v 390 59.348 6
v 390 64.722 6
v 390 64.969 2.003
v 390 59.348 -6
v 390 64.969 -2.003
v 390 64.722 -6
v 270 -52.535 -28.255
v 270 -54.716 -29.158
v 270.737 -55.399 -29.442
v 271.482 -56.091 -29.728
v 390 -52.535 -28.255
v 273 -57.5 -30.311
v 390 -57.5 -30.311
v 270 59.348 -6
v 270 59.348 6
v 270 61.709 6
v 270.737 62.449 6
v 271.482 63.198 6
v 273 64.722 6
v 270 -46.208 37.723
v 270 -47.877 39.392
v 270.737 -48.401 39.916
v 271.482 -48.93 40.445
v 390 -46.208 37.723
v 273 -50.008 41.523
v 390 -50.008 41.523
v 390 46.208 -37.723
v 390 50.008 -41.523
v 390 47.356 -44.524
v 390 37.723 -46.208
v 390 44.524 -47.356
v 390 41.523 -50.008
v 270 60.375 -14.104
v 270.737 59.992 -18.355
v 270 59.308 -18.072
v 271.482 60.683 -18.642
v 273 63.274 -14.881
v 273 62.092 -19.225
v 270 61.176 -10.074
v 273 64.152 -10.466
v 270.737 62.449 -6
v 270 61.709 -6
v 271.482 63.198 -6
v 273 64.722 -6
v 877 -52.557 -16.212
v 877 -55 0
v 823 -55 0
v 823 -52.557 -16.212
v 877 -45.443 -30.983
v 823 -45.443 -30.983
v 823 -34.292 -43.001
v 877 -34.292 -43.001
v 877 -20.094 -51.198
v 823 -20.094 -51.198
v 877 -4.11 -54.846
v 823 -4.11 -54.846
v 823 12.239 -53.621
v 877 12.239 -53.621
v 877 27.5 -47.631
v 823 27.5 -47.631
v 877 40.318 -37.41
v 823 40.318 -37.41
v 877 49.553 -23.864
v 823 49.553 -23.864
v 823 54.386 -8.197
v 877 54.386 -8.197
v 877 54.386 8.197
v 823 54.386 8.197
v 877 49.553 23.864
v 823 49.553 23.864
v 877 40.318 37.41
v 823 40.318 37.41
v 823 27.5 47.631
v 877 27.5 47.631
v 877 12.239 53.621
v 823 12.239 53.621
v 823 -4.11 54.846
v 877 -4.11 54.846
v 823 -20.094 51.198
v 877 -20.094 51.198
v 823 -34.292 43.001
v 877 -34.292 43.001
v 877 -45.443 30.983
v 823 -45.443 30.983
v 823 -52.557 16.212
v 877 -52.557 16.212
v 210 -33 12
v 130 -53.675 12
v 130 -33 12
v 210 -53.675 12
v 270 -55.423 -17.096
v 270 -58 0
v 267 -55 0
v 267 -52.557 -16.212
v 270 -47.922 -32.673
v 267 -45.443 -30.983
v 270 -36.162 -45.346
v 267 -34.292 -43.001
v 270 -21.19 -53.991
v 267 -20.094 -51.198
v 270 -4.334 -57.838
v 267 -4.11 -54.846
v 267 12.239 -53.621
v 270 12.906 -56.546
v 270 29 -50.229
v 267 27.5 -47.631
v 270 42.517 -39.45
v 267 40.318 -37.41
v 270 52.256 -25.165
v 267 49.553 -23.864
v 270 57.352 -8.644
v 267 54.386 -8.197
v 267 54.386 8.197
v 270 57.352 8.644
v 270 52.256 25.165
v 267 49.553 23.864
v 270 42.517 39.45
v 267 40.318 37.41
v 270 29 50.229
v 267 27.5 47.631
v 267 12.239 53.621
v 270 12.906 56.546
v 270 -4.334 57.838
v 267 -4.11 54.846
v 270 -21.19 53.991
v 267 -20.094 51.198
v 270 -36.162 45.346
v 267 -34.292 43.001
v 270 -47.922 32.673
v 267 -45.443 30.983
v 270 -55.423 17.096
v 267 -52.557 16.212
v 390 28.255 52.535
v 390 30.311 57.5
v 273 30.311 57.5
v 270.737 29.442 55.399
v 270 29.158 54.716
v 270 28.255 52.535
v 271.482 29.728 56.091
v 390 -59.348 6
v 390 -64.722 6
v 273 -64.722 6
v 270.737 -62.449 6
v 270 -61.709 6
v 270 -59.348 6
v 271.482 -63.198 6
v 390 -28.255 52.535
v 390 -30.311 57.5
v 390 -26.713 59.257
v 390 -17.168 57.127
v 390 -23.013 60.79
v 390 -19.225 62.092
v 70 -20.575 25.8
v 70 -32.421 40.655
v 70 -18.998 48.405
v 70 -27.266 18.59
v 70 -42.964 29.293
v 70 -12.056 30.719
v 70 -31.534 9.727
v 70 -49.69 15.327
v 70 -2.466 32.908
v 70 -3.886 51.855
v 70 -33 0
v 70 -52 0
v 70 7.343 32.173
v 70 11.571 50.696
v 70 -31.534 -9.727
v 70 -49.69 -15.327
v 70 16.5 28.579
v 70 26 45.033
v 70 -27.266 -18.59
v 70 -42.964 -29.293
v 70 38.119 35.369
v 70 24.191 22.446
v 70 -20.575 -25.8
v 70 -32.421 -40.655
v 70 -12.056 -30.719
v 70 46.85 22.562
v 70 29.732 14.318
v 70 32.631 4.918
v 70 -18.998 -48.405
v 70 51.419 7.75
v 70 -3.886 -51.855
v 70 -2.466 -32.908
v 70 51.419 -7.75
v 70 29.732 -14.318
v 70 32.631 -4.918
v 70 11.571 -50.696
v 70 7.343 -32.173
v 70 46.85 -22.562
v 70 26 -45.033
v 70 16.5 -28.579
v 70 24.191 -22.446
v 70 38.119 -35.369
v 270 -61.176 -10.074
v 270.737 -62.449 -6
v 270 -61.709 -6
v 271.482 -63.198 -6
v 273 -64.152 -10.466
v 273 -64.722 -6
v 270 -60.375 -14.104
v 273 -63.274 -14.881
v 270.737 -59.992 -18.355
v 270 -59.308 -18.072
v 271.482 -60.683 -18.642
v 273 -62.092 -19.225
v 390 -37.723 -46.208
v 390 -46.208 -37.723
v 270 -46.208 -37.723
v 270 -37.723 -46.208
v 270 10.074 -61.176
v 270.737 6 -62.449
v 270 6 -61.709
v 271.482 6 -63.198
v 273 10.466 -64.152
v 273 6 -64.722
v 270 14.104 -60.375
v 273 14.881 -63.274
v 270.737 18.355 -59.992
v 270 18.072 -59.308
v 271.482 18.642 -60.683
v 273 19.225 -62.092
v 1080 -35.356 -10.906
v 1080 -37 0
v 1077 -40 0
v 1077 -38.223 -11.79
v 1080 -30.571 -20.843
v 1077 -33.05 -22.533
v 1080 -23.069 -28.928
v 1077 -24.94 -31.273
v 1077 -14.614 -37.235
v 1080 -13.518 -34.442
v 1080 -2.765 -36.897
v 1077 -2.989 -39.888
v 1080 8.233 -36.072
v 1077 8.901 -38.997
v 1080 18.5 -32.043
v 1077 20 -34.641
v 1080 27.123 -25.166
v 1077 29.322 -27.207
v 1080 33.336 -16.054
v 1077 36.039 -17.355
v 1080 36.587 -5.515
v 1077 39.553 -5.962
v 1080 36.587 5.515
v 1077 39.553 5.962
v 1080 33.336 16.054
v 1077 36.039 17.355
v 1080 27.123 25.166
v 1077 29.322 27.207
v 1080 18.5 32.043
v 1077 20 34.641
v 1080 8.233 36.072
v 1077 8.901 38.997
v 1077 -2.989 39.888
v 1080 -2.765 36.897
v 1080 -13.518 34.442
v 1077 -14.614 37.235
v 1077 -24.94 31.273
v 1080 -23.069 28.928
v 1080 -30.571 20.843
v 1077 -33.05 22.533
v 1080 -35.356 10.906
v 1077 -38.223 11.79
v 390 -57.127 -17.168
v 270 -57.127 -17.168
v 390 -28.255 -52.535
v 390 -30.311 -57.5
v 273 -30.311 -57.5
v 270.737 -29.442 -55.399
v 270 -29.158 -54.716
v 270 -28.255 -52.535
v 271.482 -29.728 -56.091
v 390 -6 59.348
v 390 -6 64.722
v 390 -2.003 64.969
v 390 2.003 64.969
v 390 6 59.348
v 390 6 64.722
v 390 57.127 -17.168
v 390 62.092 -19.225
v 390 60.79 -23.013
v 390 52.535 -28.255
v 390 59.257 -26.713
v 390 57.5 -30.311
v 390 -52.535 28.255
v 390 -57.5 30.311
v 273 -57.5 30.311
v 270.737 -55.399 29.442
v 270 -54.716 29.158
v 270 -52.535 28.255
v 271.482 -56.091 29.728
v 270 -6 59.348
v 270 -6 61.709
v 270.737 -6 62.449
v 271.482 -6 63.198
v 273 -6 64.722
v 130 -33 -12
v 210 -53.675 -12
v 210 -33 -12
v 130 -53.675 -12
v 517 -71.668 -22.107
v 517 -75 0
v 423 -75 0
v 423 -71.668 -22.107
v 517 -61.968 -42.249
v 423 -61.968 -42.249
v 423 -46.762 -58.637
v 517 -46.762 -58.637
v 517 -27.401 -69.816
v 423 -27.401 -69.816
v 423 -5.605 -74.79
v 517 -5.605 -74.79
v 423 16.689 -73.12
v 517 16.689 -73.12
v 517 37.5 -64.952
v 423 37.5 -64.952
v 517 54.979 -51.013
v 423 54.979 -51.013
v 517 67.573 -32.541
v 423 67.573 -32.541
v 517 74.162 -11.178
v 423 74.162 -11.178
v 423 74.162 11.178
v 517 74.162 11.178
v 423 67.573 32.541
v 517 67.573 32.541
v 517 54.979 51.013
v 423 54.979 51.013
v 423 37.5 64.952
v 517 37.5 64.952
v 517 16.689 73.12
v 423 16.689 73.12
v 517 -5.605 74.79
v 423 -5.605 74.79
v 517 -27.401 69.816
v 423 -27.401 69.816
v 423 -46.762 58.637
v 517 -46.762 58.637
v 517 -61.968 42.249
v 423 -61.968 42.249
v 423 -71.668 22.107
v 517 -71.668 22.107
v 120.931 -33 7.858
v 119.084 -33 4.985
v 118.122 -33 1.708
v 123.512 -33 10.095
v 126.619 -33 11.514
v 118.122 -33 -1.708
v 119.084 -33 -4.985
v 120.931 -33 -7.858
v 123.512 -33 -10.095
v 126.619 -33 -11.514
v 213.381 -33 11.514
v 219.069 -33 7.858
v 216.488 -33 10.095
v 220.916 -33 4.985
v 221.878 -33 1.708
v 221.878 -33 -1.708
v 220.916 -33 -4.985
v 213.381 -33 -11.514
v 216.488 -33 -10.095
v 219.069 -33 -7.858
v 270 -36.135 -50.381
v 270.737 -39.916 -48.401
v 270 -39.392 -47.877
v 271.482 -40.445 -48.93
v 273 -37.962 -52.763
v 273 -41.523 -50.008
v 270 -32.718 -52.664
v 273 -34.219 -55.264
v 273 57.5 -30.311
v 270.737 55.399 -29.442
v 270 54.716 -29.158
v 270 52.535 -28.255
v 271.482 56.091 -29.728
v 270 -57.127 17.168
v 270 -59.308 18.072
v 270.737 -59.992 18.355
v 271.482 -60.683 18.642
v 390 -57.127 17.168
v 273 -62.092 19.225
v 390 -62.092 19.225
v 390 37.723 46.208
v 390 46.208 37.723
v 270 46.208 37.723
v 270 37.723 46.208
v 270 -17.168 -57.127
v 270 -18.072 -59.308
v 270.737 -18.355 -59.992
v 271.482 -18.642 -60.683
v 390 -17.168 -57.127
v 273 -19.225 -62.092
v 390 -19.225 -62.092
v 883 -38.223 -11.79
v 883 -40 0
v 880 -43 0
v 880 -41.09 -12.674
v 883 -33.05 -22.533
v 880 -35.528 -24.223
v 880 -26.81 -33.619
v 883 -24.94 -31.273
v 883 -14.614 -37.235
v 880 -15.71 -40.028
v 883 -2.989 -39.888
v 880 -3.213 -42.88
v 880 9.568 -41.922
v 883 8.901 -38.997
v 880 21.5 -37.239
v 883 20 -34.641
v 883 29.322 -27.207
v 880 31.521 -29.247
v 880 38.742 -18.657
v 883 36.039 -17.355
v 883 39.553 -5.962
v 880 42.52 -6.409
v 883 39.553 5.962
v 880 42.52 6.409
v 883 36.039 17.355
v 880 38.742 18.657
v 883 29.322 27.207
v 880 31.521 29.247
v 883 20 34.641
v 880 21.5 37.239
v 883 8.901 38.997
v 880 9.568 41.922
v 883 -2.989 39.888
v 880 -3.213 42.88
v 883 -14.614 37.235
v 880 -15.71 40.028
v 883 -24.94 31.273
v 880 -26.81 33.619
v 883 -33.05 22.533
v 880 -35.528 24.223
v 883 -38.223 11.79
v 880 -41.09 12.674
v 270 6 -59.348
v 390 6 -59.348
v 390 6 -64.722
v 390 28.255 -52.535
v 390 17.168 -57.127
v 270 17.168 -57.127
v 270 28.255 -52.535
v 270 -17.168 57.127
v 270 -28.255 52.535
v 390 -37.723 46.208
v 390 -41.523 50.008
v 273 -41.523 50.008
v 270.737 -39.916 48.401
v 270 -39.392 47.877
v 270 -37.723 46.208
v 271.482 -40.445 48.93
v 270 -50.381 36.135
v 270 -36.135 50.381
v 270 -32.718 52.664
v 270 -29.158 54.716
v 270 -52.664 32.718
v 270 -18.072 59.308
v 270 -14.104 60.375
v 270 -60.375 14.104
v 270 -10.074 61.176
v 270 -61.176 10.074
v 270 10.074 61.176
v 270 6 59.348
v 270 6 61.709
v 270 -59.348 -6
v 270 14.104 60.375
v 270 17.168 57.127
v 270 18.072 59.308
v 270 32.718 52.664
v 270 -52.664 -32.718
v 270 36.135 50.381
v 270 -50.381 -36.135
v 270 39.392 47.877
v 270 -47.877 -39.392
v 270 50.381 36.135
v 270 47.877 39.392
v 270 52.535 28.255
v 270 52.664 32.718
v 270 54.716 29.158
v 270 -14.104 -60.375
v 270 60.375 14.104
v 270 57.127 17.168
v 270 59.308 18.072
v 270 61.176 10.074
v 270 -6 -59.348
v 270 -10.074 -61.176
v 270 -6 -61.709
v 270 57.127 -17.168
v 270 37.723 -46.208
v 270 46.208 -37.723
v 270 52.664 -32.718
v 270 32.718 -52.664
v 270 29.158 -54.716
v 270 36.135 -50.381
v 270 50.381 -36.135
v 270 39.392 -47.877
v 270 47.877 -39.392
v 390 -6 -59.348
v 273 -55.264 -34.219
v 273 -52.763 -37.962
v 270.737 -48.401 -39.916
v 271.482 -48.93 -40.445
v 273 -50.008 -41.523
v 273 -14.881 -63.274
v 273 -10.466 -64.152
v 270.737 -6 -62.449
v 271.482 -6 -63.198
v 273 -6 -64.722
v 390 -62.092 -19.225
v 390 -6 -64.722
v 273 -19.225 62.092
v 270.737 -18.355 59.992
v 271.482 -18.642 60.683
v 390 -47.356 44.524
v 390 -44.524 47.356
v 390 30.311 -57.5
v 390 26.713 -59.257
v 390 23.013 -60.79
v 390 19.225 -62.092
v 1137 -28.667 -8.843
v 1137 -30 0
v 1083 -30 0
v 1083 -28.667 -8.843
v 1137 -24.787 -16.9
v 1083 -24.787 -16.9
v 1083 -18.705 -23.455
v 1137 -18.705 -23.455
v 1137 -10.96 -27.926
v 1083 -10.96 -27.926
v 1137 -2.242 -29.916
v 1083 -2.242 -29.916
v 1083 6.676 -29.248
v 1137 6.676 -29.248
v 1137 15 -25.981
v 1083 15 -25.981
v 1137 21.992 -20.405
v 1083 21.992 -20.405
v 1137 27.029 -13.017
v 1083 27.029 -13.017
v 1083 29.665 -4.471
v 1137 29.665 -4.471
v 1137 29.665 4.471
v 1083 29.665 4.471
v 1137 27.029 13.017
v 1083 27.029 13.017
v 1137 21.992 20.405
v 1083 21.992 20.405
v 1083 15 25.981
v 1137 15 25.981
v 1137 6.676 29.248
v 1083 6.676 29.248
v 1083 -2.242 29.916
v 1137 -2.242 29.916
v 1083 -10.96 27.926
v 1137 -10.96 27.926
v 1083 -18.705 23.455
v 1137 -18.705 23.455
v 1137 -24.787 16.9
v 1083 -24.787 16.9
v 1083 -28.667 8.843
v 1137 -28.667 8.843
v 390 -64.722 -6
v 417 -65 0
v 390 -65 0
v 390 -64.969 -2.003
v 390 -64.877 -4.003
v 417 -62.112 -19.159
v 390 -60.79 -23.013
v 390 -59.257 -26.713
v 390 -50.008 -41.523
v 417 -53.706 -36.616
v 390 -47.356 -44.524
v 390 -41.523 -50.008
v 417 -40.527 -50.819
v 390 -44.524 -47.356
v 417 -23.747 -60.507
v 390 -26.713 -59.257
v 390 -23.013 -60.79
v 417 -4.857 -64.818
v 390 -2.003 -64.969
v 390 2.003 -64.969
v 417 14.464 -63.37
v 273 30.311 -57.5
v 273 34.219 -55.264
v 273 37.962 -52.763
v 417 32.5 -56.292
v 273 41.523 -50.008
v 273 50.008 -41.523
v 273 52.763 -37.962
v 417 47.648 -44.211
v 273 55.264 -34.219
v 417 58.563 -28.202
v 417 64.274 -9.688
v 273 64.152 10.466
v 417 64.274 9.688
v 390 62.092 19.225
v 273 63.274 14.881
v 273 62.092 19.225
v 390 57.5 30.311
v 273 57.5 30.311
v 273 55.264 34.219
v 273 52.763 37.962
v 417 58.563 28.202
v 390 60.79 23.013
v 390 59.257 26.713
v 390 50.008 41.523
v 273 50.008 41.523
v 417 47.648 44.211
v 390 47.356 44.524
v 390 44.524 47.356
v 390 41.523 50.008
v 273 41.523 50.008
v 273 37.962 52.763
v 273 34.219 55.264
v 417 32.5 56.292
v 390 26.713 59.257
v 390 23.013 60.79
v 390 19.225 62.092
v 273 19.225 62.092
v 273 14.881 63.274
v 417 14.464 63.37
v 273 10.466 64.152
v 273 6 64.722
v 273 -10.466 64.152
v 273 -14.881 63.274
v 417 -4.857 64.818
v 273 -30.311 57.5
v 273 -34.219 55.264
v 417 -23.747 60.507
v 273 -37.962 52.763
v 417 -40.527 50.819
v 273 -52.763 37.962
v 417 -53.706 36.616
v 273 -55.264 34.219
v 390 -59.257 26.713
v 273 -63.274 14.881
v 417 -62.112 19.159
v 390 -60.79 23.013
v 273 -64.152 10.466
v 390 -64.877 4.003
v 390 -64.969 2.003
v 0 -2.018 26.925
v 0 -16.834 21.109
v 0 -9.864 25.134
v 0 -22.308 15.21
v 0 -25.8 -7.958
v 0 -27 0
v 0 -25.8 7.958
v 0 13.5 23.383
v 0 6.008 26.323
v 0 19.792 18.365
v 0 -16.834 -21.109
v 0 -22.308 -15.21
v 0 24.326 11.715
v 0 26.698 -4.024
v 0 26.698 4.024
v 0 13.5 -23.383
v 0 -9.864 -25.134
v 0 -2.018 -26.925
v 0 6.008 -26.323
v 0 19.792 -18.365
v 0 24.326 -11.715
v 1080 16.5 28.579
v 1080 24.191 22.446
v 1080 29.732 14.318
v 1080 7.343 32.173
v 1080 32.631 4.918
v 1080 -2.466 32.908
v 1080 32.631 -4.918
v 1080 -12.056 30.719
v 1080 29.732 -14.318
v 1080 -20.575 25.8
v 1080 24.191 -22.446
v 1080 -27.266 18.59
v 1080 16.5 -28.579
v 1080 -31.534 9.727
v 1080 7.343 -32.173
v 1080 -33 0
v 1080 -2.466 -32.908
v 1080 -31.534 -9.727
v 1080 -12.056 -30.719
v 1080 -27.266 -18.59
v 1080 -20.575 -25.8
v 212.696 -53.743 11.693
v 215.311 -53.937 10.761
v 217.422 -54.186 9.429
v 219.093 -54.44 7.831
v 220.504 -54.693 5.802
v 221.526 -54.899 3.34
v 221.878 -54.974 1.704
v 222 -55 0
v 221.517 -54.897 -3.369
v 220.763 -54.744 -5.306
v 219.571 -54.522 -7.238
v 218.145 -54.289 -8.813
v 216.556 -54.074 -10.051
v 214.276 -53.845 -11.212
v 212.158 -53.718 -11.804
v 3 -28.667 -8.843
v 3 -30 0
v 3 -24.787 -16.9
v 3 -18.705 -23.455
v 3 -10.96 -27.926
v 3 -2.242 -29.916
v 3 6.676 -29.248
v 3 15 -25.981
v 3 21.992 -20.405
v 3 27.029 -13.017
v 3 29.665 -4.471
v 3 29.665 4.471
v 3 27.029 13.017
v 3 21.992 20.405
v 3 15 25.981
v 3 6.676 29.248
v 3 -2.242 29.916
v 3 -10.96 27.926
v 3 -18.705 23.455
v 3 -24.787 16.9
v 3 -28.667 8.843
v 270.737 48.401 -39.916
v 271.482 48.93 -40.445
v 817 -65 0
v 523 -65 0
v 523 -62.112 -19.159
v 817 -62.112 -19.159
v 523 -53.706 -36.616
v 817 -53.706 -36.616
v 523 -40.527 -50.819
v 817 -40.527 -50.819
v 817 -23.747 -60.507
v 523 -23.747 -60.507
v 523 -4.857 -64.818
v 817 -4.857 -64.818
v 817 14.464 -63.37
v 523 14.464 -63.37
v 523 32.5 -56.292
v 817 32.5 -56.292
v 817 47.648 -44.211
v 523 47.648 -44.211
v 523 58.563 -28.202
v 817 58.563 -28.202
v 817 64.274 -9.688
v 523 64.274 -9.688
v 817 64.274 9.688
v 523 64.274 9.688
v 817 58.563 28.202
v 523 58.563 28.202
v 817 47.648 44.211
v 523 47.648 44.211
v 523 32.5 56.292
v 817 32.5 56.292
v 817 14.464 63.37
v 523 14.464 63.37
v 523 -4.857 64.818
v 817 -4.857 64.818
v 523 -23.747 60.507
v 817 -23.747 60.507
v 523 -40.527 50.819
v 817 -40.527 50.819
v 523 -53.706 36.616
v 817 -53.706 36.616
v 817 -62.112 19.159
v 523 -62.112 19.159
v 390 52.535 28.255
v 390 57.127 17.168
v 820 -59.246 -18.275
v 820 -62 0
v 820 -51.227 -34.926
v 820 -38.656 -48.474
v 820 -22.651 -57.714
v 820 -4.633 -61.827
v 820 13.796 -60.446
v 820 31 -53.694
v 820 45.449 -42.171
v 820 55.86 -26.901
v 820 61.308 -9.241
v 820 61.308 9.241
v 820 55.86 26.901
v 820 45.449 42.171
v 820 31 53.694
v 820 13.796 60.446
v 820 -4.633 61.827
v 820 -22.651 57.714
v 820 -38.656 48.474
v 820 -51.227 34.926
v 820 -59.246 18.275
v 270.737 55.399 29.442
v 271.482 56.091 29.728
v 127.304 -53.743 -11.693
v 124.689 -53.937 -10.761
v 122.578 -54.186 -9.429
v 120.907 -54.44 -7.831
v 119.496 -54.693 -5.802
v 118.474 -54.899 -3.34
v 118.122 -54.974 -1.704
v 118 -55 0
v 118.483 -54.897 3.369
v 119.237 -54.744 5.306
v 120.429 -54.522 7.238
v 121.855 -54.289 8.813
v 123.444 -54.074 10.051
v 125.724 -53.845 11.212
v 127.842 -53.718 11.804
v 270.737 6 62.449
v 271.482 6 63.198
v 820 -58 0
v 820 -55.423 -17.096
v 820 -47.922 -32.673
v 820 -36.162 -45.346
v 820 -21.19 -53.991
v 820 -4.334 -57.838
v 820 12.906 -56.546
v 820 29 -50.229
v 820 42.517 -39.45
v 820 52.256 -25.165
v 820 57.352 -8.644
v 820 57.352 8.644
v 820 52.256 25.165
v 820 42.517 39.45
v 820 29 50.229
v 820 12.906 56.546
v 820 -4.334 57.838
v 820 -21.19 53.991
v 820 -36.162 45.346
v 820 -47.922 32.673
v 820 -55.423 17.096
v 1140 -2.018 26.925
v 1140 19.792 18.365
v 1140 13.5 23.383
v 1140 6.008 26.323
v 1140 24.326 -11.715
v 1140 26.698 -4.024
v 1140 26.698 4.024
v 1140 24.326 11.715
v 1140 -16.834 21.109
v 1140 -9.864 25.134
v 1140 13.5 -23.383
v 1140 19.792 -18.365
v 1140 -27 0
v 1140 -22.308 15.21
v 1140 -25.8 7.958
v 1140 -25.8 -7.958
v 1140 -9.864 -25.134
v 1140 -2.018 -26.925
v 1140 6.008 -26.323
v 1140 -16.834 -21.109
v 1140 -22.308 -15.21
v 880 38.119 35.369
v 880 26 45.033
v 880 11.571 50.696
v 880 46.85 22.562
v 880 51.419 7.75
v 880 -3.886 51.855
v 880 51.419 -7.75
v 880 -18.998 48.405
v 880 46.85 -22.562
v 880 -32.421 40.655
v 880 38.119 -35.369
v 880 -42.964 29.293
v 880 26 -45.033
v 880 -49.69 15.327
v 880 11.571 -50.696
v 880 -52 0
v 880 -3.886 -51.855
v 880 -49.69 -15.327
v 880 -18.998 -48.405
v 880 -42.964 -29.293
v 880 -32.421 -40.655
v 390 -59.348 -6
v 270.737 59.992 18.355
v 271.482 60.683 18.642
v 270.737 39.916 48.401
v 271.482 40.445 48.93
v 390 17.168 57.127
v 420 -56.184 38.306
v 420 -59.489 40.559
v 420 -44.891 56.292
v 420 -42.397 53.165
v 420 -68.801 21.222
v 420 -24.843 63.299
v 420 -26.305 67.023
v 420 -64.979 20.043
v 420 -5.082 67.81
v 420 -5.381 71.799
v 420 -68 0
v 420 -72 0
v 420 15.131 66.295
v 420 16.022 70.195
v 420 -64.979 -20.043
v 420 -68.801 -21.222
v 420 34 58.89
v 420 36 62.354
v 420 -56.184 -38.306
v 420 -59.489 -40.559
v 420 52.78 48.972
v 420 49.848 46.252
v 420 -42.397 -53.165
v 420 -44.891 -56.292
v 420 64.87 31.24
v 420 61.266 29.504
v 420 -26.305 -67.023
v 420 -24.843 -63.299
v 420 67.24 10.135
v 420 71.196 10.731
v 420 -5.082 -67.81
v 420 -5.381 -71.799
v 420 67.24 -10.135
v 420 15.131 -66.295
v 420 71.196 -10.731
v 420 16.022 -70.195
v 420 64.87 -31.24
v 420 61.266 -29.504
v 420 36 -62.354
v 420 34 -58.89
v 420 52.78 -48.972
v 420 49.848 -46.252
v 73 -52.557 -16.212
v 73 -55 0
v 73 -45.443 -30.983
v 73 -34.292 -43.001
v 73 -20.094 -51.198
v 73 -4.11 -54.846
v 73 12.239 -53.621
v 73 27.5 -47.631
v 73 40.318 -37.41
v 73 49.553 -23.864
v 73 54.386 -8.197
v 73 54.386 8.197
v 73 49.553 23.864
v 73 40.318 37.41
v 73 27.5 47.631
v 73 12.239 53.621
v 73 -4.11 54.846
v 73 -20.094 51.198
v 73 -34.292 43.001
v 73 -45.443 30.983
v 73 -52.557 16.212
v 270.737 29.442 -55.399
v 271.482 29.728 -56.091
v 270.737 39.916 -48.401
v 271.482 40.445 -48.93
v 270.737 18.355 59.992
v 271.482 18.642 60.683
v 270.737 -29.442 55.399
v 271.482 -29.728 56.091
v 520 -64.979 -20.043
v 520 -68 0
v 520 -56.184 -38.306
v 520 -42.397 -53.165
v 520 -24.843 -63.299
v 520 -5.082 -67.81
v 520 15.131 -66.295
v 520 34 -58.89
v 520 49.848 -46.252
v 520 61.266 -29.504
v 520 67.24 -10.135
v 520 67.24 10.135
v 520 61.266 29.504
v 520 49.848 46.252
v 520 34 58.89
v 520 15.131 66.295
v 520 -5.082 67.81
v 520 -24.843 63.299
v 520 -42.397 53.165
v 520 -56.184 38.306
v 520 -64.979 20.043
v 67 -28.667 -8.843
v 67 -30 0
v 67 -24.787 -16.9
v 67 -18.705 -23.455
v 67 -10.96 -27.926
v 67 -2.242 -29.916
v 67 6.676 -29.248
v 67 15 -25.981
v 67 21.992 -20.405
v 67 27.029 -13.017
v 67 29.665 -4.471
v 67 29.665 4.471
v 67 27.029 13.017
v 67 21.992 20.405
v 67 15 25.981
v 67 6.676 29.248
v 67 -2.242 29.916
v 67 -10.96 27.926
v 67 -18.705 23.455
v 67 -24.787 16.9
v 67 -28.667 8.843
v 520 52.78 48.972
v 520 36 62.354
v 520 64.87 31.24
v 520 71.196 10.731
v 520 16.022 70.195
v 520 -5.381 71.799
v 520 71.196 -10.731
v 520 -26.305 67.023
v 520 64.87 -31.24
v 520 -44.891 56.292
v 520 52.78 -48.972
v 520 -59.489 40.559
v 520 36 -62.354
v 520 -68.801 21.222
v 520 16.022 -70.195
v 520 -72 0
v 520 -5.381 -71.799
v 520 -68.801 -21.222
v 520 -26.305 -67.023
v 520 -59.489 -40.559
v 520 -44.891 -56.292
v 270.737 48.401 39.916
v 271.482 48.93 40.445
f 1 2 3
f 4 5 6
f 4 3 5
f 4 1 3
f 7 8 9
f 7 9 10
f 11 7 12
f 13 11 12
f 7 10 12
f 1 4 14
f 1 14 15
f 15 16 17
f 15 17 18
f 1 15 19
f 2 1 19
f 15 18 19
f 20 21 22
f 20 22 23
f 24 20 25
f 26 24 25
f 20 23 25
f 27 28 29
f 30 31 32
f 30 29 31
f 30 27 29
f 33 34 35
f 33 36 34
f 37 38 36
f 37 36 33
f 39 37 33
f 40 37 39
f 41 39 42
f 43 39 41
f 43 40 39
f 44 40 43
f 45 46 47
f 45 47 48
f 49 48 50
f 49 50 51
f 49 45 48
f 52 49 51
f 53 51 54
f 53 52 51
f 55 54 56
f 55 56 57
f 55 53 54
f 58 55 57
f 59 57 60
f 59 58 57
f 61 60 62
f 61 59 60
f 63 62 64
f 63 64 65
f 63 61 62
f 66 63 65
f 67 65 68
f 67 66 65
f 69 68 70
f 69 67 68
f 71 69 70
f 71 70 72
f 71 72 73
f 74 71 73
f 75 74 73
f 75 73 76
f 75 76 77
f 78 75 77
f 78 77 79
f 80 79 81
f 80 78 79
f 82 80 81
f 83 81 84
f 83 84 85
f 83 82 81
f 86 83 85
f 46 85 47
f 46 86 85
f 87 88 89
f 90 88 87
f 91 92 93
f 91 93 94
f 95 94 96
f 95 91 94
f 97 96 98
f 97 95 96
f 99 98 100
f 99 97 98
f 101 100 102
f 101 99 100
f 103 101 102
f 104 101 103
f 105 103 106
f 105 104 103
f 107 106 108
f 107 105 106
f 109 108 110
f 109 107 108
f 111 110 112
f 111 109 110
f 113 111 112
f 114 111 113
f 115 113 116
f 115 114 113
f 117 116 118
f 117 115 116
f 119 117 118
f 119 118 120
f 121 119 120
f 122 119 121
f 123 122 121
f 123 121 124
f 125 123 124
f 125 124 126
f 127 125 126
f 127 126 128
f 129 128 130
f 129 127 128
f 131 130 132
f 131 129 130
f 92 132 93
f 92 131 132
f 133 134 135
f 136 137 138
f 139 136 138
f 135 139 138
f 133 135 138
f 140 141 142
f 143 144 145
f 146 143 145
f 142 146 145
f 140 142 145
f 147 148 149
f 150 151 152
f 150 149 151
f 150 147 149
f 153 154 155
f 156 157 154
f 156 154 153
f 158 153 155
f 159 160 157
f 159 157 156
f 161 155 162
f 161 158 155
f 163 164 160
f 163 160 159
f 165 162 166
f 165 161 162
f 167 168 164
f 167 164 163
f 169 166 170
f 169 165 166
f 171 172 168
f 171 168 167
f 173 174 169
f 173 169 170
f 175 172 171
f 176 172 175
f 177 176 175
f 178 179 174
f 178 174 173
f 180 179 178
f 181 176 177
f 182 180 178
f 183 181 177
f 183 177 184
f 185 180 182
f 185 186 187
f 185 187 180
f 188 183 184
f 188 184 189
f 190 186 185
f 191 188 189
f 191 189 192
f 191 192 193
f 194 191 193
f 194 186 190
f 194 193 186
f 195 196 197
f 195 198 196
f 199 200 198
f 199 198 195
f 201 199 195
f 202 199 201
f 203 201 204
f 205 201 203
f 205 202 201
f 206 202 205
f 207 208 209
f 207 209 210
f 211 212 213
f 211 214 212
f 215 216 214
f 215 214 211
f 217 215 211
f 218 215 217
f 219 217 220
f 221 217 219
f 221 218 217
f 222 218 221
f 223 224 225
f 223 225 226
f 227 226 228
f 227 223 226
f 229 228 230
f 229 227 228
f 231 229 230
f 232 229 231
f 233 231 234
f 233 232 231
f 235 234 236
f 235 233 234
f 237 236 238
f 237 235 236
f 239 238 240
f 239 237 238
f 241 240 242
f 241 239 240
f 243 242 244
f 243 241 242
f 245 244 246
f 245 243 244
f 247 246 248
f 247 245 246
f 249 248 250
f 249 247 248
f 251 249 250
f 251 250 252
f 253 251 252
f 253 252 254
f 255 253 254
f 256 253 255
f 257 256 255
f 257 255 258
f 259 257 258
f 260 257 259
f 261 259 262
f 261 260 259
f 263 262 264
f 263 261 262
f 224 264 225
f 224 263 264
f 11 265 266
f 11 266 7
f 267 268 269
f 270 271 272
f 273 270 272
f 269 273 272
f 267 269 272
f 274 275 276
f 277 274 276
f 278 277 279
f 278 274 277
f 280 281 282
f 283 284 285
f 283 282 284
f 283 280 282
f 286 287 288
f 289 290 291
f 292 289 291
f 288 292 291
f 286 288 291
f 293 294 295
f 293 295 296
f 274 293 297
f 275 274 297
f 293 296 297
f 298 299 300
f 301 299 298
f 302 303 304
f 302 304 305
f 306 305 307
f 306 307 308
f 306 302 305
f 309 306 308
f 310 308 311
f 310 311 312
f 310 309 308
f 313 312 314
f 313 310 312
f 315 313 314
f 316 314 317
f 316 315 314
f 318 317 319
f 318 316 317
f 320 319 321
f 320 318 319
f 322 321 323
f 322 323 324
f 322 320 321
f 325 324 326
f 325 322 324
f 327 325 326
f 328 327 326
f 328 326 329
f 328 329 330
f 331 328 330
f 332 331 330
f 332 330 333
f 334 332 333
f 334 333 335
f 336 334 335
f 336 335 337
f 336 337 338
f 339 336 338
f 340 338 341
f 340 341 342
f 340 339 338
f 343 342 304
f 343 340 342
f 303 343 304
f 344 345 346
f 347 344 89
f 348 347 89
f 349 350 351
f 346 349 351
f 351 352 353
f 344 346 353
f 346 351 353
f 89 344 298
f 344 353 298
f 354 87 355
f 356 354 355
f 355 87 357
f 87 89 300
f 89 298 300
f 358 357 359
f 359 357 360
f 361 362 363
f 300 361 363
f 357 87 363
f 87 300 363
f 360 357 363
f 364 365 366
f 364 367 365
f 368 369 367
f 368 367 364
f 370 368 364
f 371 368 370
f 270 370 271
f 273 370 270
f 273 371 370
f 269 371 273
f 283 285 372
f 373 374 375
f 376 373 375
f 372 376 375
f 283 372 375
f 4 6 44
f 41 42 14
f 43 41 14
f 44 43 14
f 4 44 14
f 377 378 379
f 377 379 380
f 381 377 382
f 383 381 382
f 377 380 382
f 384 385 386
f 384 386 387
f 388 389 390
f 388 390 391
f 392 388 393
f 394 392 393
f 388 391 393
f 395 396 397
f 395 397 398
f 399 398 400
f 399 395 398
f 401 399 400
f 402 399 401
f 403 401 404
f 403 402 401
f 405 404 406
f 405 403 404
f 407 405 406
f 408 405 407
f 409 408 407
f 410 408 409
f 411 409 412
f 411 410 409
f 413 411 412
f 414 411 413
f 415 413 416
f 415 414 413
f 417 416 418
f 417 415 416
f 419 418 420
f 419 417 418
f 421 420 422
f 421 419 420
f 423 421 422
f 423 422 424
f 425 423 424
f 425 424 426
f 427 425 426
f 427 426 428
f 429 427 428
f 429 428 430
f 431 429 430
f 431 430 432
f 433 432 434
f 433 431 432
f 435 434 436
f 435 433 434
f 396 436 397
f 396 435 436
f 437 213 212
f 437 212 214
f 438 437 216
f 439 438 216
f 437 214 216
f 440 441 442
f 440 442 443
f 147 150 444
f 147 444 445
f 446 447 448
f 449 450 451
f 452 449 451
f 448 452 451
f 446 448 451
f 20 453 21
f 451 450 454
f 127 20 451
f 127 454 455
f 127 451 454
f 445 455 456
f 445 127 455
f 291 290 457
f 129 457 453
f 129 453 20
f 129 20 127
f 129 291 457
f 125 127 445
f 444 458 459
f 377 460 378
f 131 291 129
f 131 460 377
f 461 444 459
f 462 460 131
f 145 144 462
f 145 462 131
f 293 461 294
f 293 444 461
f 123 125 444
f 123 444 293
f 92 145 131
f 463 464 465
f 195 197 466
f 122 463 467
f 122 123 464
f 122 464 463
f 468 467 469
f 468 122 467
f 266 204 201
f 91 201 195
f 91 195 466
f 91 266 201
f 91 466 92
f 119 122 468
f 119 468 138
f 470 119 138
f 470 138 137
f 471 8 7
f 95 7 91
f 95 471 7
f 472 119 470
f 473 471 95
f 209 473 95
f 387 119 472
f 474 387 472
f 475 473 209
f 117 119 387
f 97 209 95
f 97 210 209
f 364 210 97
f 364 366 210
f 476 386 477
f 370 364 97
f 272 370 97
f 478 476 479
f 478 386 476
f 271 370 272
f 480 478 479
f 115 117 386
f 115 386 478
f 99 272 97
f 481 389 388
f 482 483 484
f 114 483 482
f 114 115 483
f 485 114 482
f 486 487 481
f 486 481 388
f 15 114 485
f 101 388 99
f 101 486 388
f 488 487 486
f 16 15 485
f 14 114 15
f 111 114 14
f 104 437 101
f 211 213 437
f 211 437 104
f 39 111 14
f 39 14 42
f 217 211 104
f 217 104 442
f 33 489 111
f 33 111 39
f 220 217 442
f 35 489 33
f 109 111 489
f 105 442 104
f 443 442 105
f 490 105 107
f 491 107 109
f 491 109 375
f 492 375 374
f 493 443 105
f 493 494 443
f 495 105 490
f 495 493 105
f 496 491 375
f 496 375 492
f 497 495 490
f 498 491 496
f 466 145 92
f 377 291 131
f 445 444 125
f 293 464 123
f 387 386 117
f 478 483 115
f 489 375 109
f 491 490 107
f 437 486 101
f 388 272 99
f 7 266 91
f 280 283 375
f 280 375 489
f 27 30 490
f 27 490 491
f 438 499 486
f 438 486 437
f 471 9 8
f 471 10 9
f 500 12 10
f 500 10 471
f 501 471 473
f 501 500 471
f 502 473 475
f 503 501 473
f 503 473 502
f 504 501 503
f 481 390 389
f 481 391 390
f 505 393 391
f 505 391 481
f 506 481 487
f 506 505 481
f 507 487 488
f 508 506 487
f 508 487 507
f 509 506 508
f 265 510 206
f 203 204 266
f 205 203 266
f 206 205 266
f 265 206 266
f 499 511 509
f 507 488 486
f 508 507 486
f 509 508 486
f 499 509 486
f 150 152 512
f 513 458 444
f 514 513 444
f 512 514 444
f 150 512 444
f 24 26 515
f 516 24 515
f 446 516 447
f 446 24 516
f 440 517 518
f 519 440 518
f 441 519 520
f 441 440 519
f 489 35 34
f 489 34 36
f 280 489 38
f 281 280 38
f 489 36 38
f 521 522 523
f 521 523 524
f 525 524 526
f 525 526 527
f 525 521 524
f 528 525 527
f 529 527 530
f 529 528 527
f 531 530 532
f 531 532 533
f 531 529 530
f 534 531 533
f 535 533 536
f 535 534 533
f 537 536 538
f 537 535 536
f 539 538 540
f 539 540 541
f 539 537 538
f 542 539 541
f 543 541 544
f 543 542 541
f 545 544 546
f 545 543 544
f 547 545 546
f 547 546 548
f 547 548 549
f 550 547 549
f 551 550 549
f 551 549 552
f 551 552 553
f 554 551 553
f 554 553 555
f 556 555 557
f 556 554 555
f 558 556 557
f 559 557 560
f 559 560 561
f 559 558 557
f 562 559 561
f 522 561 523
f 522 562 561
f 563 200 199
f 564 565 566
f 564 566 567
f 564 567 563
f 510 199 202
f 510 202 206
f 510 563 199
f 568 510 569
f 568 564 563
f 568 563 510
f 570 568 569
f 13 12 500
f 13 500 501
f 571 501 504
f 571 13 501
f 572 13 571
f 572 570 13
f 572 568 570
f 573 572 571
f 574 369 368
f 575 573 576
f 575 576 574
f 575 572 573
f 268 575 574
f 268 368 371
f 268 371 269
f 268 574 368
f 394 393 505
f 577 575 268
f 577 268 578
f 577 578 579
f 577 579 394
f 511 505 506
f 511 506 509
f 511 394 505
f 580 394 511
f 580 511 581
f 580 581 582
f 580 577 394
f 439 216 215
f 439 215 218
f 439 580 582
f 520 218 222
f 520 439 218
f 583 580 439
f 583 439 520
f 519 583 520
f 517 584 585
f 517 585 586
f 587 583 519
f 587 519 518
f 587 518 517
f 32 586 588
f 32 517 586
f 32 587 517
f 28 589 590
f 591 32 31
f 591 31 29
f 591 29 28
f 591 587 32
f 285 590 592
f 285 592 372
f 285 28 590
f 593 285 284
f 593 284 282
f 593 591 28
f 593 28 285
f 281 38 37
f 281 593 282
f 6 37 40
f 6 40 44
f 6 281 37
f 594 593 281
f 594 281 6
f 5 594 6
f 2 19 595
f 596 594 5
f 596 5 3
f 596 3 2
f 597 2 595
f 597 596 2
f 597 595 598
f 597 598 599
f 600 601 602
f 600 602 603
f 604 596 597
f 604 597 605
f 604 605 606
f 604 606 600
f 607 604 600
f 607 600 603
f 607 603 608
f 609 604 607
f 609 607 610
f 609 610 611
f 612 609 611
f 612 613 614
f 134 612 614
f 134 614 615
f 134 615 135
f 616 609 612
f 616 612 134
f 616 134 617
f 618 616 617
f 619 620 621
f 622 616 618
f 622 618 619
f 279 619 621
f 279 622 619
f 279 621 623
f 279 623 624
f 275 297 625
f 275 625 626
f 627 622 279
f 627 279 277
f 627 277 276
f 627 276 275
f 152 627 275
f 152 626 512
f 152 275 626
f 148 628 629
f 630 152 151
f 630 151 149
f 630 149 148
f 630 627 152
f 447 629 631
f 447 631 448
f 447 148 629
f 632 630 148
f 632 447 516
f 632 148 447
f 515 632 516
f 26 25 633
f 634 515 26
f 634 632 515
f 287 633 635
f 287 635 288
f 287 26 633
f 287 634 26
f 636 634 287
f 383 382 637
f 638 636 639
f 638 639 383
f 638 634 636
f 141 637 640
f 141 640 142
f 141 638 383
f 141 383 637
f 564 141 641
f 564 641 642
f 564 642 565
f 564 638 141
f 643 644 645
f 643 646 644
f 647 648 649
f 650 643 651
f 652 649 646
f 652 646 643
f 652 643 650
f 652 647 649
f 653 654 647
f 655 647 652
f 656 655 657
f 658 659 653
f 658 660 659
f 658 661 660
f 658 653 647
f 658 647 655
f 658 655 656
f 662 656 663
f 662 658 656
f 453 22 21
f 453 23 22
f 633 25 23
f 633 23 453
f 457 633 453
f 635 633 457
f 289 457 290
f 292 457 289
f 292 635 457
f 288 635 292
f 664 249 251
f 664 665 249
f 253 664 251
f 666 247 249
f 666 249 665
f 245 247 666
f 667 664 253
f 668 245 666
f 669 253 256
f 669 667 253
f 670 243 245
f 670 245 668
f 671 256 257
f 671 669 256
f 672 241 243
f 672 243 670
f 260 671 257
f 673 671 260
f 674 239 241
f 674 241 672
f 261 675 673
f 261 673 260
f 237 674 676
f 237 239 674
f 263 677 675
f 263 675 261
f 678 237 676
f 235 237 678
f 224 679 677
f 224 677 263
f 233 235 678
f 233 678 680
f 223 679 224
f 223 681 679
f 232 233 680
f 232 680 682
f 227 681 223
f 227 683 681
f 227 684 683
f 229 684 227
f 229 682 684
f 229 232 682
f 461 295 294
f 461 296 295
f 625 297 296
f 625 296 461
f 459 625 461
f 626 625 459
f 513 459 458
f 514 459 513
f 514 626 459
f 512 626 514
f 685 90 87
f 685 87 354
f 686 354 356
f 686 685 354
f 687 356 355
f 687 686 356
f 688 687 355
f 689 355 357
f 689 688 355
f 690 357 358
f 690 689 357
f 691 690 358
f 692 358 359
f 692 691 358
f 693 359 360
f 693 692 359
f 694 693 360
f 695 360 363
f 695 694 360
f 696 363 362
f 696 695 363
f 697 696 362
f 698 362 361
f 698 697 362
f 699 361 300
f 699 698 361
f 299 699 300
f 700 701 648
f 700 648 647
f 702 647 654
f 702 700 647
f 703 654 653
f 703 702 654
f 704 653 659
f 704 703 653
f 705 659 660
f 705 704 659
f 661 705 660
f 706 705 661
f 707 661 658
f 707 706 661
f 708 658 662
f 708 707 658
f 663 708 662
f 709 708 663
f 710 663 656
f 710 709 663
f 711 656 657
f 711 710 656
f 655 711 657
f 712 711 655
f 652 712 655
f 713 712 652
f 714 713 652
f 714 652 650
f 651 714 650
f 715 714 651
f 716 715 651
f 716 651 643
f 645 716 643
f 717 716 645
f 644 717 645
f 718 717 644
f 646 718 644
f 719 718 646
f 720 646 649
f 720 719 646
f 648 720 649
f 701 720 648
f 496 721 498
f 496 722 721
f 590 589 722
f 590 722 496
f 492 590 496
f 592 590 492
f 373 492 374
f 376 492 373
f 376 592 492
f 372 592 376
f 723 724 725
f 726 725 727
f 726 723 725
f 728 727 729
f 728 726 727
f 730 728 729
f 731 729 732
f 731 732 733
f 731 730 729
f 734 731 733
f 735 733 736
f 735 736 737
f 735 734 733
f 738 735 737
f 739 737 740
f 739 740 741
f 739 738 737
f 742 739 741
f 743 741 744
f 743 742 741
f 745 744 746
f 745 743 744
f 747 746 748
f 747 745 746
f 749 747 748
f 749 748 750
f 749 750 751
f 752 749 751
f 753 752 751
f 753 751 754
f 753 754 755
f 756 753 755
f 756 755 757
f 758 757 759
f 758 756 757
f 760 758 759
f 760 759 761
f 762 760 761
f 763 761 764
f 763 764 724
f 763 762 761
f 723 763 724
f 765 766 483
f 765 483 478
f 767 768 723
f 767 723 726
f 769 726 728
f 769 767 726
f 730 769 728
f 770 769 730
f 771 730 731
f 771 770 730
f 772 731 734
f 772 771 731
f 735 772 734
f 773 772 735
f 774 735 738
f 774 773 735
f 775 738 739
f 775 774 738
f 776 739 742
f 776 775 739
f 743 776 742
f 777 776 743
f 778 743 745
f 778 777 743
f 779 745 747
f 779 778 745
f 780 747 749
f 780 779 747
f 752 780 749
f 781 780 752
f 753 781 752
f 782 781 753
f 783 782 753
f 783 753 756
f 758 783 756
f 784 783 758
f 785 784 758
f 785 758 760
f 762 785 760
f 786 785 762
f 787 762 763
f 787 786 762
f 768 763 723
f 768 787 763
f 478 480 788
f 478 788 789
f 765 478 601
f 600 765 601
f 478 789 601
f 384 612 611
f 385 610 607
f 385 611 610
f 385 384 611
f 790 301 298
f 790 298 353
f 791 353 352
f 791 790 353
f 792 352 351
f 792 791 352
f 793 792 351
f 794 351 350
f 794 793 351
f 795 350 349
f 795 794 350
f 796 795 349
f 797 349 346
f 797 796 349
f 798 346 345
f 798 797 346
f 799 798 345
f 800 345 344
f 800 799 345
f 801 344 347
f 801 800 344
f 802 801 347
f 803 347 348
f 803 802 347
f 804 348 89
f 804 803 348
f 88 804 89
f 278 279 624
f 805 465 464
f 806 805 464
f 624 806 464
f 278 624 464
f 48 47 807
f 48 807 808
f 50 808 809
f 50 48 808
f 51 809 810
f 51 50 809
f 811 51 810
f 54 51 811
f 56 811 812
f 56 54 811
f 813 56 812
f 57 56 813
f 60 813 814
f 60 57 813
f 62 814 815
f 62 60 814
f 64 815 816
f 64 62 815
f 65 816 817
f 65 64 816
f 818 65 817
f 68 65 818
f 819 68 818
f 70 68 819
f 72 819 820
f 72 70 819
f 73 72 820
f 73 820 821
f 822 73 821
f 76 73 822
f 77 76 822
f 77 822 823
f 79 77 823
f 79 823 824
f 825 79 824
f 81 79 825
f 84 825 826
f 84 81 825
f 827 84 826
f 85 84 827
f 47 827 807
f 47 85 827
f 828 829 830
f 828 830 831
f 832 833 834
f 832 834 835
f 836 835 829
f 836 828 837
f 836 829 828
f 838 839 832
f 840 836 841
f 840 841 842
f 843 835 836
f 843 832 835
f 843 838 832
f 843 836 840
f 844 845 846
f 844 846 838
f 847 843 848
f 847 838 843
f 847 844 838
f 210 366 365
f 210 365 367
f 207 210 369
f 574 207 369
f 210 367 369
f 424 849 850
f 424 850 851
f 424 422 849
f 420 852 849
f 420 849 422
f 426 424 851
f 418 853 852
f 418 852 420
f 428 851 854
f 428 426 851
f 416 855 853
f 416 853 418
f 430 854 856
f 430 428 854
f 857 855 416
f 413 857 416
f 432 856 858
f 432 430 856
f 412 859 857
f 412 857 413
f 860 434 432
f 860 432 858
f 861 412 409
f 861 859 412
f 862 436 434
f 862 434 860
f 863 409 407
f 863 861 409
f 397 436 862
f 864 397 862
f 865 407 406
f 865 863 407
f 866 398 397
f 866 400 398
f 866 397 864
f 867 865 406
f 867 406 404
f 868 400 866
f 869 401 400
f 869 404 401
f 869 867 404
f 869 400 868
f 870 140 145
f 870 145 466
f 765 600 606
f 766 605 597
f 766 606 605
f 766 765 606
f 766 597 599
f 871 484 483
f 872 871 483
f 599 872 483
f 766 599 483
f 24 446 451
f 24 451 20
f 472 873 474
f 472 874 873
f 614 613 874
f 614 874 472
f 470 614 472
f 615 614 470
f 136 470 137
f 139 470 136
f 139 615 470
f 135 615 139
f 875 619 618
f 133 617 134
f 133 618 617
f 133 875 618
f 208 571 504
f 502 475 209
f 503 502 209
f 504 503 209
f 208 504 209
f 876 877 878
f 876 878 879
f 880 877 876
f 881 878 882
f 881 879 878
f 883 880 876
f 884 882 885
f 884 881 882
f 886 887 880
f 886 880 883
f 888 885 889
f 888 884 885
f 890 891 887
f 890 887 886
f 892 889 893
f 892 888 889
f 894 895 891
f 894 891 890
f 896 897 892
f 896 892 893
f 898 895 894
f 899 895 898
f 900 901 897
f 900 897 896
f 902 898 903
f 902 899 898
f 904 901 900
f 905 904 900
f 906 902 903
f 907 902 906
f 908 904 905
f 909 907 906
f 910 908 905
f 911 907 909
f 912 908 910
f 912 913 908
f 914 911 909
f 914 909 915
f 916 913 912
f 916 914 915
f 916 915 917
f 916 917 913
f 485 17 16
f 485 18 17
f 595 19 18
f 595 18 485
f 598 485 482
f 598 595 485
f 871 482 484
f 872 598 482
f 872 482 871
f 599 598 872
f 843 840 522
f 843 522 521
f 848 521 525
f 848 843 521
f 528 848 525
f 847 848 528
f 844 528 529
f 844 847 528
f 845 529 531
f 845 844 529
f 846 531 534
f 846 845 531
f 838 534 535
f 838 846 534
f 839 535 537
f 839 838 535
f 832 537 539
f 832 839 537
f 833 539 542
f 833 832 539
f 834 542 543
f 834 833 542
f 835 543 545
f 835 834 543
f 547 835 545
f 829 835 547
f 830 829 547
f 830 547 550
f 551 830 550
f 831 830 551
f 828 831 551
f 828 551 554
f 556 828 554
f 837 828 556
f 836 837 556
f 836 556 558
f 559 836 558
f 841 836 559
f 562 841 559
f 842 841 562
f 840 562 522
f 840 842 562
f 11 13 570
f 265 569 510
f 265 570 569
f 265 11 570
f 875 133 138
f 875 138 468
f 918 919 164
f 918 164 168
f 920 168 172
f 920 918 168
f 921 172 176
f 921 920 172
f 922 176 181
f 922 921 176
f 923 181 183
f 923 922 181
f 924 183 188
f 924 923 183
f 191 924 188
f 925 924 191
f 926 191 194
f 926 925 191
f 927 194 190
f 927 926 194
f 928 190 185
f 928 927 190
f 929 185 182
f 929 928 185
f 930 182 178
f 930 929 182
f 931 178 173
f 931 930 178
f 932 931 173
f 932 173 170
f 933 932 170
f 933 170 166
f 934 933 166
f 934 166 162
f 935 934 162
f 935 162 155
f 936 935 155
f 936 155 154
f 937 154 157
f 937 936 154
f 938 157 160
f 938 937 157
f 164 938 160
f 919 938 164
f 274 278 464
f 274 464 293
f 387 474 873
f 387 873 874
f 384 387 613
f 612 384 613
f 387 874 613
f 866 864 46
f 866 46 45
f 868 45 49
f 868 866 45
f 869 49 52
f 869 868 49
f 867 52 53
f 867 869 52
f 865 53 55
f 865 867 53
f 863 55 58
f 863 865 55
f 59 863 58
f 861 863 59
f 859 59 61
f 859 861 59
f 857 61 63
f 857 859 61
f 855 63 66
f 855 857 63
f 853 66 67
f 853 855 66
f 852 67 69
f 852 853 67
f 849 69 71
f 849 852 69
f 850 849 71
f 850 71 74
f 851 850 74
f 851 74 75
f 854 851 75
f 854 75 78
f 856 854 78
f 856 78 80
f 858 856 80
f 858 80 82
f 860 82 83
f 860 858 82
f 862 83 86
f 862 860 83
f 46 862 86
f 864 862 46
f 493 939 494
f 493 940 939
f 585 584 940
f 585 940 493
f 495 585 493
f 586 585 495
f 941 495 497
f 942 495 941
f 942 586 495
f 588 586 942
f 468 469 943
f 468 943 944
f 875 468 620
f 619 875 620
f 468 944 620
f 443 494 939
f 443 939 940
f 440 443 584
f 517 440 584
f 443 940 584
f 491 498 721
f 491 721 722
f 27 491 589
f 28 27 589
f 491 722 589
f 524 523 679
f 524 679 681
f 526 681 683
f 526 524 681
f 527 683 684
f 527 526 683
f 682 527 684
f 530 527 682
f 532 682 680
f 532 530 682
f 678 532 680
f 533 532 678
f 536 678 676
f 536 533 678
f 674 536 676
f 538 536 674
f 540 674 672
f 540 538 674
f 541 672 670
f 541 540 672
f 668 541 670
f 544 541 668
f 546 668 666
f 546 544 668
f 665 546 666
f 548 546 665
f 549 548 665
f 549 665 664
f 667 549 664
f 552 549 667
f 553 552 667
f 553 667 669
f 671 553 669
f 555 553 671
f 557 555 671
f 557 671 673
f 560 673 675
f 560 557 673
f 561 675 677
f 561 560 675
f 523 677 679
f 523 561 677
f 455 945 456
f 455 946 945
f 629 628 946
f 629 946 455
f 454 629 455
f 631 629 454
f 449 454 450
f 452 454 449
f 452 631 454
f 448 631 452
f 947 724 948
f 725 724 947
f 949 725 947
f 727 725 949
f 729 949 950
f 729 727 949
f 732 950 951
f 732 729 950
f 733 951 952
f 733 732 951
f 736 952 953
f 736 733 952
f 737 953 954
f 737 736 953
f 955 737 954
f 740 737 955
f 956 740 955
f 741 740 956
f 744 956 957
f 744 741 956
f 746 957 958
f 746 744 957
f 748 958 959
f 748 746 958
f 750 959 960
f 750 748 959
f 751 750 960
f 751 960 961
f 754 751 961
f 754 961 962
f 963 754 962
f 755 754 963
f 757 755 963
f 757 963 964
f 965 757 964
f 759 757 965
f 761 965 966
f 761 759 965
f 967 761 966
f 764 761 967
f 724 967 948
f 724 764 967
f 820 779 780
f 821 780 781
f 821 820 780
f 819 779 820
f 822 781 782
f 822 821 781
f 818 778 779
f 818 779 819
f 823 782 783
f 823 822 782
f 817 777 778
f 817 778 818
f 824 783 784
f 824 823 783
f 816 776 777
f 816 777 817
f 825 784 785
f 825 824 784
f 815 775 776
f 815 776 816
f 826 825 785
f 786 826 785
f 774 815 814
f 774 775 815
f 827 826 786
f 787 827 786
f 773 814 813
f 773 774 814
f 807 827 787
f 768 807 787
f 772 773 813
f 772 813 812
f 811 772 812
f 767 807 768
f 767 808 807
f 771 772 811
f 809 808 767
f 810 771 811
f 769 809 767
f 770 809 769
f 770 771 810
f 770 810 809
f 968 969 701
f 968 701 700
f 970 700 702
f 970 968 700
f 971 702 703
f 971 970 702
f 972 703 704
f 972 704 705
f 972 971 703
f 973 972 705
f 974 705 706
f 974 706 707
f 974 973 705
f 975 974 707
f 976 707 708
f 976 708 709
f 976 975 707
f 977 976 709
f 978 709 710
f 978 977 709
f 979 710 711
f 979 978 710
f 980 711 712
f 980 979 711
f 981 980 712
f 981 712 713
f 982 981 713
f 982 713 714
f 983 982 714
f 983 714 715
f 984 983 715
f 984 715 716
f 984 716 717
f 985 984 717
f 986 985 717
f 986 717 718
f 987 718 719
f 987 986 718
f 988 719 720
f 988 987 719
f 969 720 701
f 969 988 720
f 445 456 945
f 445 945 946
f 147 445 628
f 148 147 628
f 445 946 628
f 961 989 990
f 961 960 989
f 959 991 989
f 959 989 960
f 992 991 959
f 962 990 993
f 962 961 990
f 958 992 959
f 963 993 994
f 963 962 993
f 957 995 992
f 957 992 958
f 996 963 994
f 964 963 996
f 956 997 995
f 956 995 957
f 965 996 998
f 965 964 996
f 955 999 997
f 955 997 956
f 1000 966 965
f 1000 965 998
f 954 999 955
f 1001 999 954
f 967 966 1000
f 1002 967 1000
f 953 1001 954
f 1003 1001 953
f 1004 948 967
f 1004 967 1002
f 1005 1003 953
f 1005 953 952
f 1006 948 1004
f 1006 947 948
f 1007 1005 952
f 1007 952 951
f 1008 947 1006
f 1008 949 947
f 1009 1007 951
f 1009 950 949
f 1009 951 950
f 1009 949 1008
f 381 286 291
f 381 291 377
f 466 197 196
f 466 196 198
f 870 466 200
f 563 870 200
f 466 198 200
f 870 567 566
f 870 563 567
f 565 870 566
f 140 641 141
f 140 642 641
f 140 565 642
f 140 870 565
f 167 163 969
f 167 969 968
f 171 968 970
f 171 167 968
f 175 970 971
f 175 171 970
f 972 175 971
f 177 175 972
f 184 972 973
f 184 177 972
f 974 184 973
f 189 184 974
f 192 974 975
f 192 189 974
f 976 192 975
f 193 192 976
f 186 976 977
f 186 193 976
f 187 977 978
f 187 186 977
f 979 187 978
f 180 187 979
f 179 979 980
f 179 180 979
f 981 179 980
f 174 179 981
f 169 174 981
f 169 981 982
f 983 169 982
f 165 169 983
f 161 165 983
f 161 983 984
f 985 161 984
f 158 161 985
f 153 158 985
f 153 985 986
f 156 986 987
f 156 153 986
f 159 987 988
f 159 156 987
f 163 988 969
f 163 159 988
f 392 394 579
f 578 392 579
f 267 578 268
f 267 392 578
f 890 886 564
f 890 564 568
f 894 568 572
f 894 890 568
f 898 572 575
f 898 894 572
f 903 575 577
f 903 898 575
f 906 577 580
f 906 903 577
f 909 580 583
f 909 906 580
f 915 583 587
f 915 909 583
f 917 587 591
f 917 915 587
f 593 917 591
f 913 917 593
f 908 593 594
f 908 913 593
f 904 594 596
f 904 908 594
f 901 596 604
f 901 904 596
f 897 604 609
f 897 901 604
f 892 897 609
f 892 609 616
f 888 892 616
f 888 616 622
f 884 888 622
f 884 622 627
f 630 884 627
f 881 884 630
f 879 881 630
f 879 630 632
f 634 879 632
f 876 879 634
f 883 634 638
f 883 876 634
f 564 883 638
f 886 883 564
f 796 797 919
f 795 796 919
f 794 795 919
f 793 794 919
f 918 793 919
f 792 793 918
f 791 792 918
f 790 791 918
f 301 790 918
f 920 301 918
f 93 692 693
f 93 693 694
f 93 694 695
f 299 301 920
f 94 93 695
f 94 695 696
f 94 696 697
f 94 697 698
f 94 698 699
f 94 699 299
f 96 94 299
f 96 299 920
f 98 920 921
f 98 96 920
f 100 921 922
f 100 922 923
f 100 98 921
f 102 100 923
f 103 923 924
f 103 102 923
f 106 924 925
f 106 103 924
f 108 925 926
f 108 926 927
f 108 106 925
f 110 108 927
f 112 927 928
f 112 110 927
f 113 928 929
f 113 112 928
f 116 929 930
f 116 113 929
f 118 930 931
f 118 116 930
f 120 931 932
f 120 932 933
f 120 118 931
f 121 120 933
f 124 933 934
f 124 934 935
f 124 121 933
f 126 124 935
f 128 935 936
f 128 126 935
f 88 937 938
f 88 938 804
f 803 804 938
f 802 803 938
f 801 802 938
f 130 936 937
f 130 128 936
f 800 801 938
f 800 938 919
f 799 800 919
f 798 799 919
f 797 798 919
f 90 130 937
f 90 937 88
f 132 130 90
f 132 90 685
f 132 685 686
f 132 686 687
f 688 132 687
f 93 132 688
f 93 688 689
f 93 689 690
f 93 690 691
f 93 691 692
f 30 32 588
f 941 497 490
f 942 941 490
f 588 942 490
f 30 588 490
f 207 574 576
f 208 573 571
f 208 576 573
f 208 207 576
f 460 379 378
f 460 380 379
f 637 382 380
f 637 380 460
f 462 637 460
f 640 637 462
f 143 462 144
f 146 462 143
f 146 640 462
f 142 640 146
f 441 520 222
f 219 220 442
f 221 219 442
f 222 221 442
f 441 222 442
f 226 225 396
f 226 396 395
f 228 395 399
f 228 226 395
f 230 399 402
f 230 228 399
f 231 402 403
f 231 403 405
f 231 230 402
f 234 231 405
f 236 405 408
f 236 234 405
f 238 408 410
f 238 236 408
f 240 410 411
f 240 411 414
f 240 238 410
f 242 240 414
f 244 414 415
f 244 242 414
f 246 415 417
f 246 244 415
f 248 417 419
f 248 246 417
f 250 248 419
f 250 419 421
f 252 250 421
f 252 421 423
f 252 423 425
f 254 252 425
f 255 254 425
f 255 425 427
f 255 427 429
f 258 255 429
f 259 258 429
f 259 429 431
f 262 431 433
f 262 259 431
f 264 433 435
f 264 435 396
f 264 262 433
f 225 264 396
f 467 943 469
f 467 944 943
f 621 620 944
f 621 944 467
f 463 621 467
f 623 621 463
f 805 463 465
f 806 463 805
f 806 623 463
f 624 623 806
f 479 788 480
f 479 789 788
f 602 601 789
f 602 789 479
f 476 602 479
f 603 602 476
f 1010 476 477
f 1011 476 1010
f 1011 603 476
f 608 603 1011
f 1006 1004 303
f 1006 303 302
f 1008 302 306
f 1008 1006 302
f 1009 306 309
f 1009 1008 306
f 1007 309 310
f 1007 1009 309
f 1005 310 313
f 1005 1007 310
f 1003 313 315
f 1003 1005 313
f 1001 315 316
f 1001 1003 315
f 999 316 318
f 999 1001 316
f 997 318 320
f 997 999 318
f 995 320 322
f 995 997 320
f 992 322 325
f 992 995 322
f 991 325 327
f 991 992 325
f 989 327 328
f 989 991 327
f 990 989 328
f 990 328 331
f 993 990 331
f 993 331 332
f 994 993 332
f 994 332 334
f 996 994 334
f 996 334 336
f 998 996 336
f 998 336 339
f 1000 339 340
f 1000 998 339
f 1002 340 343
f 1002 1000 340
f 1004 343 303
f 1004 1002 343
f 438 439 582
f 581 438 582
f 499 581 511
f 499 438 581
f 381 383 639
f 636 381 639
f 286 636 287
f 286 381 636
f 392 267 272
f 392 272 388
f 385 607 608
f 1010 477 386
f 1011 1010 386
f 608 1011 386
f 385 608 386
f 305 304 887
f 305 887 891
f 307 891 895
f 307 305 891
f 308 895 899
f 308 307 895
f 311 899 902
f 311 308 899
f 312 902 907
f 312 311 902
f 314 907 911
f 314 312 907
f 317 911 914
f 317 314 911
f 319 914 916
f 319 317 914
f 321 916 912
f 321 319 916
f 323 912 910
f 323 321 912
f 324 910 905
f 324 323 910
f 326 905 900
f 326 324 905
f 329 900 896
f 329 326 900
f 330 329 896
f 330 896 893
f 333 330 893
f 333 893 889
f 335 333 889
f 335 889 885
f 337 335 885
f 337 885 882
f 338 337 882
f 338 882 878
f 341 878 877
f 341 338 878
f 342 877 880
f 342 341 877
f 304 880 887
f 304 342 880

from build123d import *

# Parameters (mm, degrees)
WYTNIJ_WYCI_GNI_CIE1_DEPTH = 22
WYTNIJ_WYCI_GNI_CIE2_DEPTH = 120
SZYK_KO_OWY2_COUNT         = 16
SFAZOWANIE1_SIZE           = 3


with BuildPart() as part:
    # Szkic1 → Obrót1 (revolve)
    with BuildSketch(Plane.XY, mode=Mode.PRIVATE) as obr_t1_sk:
        Polygon((0, 0), (0, 30), (70, 30), (70, 55), (270, 55), (270, 65), (420, 65), (420, 75), (520, 75), (520, 65), (820, 65), (820, 55), (880, 55), (880, 40), (1080, 40), (1080, 30), (1140, 30), (1140, 0), align=None)
    revolve(obr_t1_sk.sketch.rotate(Axis((0, 0, 0), (1, 0, 0)), 180), axis=Axis((0, 0, 0), (1, 0, 0)))

    # Szkic2 → Wytnij-wyciągnięcie1 (cut)
    with BuildSketch(Plane(origin=(0, -55, 0), x_dir=(-1, 0, 0), z_dir=(0, -1, 0))):
        with BuildLine():
            Line((-210, 12), (-130, 12))
            ThreePointArc((-130, 12), (-118, 0), (-130, -12))
            Line((-130, -12), (-210, -12))
            ThreePointArc((-210, -12), (-222, 0), (-210, 12))
        make_face()
    extrude(amount=-WYTNIJ_WYCI_GNI_CIE1_DEPTH, mode=Mode.SUBTRACT)

    # Szkic4 → Wytnij-wyciągnięcie2 (cut)
    with BuildSketch(Plane.ZY.offset(-270)):
        Polygon((0, -65.135380743), (0, -59.348257278), (-6, -59.348257278), (-6, -71.348257278), (0, -71.348257278), align=None)
        Polygon((6, -59.348257278), (0, -59.348257278), (0, -65.135380743), (0, -71.348257278), (6, -71.348257278), align=None)
    wytnij_wyci_gni_cie2 = extrude(amount=-WYTNIJ_WYCI_GNI_CIE2_DEPTH, mode=Mode.SUBTRACT)

    # Szyk kołowy2: Wytnij-wyciągnięcie2 ×16 about axis
    szyk_ko_owy2_axis = Axis((0, 0, 0), (1, 0, 0))
    for i in range(1, SZYK_KO_OWY2_COUNT):
        add(wytnij_wyci_gni_cie2.rotate(szyk_ko_owy2_axis, i * 360 / SZYK_KO_OWY2_COUNT), mode=Mode.SUBTRACT)

    # Sfazowanie1
    sfazowanie1_edges = [part.edges().sort_by_distance(p)[0] for p in [
        (1140, 30, 0),
        (1080, 30, 0),
        (1080, 40, 0),
        (880, 40, 0),
        (880, 55, 0),
        (820, 55, 0),
        (820, 65, 0),
        (520, 65, 0),
        (520, 75, 0),
        (420, 75, 0),
        (420, 65, 0),
        (270, -63.751043226, 12.680870931),
        (270, 55, 0),
        (70, 55, 0),
        (70, 30, 0),
        (0, 30, 0),
        (270, -54.0455248, 36.112065146),
        (270, -36.112065146, 54.0455248),
        (270, -12.680870931, 63.751043226),
        (270, 12.680870931, 63.751043226),
        (270, 36.112065146, 54.0455248),
        (270, 54.0455248, 36.112065146),
        (270, 63.751043226, 12.680870931),
        (270, 63.751043226, -12.680870931),
        (270, 54.0455248, -36.112065146),
        (270, 36.112065146, -54.0455248),
        (270, 12.680870931, -63.751043226),
        (270, -12.680870931, -63.751043226),
        (270, -36.112065146, -54.0455248),
        (270, -54.0455248, -36.112065146),
        (270, -63.751043226, -12.680870931),
    ]]
    chamfer(sfazowanie1_edges, length=SFAZOWANIE1_SIZE)


solid = part.part
